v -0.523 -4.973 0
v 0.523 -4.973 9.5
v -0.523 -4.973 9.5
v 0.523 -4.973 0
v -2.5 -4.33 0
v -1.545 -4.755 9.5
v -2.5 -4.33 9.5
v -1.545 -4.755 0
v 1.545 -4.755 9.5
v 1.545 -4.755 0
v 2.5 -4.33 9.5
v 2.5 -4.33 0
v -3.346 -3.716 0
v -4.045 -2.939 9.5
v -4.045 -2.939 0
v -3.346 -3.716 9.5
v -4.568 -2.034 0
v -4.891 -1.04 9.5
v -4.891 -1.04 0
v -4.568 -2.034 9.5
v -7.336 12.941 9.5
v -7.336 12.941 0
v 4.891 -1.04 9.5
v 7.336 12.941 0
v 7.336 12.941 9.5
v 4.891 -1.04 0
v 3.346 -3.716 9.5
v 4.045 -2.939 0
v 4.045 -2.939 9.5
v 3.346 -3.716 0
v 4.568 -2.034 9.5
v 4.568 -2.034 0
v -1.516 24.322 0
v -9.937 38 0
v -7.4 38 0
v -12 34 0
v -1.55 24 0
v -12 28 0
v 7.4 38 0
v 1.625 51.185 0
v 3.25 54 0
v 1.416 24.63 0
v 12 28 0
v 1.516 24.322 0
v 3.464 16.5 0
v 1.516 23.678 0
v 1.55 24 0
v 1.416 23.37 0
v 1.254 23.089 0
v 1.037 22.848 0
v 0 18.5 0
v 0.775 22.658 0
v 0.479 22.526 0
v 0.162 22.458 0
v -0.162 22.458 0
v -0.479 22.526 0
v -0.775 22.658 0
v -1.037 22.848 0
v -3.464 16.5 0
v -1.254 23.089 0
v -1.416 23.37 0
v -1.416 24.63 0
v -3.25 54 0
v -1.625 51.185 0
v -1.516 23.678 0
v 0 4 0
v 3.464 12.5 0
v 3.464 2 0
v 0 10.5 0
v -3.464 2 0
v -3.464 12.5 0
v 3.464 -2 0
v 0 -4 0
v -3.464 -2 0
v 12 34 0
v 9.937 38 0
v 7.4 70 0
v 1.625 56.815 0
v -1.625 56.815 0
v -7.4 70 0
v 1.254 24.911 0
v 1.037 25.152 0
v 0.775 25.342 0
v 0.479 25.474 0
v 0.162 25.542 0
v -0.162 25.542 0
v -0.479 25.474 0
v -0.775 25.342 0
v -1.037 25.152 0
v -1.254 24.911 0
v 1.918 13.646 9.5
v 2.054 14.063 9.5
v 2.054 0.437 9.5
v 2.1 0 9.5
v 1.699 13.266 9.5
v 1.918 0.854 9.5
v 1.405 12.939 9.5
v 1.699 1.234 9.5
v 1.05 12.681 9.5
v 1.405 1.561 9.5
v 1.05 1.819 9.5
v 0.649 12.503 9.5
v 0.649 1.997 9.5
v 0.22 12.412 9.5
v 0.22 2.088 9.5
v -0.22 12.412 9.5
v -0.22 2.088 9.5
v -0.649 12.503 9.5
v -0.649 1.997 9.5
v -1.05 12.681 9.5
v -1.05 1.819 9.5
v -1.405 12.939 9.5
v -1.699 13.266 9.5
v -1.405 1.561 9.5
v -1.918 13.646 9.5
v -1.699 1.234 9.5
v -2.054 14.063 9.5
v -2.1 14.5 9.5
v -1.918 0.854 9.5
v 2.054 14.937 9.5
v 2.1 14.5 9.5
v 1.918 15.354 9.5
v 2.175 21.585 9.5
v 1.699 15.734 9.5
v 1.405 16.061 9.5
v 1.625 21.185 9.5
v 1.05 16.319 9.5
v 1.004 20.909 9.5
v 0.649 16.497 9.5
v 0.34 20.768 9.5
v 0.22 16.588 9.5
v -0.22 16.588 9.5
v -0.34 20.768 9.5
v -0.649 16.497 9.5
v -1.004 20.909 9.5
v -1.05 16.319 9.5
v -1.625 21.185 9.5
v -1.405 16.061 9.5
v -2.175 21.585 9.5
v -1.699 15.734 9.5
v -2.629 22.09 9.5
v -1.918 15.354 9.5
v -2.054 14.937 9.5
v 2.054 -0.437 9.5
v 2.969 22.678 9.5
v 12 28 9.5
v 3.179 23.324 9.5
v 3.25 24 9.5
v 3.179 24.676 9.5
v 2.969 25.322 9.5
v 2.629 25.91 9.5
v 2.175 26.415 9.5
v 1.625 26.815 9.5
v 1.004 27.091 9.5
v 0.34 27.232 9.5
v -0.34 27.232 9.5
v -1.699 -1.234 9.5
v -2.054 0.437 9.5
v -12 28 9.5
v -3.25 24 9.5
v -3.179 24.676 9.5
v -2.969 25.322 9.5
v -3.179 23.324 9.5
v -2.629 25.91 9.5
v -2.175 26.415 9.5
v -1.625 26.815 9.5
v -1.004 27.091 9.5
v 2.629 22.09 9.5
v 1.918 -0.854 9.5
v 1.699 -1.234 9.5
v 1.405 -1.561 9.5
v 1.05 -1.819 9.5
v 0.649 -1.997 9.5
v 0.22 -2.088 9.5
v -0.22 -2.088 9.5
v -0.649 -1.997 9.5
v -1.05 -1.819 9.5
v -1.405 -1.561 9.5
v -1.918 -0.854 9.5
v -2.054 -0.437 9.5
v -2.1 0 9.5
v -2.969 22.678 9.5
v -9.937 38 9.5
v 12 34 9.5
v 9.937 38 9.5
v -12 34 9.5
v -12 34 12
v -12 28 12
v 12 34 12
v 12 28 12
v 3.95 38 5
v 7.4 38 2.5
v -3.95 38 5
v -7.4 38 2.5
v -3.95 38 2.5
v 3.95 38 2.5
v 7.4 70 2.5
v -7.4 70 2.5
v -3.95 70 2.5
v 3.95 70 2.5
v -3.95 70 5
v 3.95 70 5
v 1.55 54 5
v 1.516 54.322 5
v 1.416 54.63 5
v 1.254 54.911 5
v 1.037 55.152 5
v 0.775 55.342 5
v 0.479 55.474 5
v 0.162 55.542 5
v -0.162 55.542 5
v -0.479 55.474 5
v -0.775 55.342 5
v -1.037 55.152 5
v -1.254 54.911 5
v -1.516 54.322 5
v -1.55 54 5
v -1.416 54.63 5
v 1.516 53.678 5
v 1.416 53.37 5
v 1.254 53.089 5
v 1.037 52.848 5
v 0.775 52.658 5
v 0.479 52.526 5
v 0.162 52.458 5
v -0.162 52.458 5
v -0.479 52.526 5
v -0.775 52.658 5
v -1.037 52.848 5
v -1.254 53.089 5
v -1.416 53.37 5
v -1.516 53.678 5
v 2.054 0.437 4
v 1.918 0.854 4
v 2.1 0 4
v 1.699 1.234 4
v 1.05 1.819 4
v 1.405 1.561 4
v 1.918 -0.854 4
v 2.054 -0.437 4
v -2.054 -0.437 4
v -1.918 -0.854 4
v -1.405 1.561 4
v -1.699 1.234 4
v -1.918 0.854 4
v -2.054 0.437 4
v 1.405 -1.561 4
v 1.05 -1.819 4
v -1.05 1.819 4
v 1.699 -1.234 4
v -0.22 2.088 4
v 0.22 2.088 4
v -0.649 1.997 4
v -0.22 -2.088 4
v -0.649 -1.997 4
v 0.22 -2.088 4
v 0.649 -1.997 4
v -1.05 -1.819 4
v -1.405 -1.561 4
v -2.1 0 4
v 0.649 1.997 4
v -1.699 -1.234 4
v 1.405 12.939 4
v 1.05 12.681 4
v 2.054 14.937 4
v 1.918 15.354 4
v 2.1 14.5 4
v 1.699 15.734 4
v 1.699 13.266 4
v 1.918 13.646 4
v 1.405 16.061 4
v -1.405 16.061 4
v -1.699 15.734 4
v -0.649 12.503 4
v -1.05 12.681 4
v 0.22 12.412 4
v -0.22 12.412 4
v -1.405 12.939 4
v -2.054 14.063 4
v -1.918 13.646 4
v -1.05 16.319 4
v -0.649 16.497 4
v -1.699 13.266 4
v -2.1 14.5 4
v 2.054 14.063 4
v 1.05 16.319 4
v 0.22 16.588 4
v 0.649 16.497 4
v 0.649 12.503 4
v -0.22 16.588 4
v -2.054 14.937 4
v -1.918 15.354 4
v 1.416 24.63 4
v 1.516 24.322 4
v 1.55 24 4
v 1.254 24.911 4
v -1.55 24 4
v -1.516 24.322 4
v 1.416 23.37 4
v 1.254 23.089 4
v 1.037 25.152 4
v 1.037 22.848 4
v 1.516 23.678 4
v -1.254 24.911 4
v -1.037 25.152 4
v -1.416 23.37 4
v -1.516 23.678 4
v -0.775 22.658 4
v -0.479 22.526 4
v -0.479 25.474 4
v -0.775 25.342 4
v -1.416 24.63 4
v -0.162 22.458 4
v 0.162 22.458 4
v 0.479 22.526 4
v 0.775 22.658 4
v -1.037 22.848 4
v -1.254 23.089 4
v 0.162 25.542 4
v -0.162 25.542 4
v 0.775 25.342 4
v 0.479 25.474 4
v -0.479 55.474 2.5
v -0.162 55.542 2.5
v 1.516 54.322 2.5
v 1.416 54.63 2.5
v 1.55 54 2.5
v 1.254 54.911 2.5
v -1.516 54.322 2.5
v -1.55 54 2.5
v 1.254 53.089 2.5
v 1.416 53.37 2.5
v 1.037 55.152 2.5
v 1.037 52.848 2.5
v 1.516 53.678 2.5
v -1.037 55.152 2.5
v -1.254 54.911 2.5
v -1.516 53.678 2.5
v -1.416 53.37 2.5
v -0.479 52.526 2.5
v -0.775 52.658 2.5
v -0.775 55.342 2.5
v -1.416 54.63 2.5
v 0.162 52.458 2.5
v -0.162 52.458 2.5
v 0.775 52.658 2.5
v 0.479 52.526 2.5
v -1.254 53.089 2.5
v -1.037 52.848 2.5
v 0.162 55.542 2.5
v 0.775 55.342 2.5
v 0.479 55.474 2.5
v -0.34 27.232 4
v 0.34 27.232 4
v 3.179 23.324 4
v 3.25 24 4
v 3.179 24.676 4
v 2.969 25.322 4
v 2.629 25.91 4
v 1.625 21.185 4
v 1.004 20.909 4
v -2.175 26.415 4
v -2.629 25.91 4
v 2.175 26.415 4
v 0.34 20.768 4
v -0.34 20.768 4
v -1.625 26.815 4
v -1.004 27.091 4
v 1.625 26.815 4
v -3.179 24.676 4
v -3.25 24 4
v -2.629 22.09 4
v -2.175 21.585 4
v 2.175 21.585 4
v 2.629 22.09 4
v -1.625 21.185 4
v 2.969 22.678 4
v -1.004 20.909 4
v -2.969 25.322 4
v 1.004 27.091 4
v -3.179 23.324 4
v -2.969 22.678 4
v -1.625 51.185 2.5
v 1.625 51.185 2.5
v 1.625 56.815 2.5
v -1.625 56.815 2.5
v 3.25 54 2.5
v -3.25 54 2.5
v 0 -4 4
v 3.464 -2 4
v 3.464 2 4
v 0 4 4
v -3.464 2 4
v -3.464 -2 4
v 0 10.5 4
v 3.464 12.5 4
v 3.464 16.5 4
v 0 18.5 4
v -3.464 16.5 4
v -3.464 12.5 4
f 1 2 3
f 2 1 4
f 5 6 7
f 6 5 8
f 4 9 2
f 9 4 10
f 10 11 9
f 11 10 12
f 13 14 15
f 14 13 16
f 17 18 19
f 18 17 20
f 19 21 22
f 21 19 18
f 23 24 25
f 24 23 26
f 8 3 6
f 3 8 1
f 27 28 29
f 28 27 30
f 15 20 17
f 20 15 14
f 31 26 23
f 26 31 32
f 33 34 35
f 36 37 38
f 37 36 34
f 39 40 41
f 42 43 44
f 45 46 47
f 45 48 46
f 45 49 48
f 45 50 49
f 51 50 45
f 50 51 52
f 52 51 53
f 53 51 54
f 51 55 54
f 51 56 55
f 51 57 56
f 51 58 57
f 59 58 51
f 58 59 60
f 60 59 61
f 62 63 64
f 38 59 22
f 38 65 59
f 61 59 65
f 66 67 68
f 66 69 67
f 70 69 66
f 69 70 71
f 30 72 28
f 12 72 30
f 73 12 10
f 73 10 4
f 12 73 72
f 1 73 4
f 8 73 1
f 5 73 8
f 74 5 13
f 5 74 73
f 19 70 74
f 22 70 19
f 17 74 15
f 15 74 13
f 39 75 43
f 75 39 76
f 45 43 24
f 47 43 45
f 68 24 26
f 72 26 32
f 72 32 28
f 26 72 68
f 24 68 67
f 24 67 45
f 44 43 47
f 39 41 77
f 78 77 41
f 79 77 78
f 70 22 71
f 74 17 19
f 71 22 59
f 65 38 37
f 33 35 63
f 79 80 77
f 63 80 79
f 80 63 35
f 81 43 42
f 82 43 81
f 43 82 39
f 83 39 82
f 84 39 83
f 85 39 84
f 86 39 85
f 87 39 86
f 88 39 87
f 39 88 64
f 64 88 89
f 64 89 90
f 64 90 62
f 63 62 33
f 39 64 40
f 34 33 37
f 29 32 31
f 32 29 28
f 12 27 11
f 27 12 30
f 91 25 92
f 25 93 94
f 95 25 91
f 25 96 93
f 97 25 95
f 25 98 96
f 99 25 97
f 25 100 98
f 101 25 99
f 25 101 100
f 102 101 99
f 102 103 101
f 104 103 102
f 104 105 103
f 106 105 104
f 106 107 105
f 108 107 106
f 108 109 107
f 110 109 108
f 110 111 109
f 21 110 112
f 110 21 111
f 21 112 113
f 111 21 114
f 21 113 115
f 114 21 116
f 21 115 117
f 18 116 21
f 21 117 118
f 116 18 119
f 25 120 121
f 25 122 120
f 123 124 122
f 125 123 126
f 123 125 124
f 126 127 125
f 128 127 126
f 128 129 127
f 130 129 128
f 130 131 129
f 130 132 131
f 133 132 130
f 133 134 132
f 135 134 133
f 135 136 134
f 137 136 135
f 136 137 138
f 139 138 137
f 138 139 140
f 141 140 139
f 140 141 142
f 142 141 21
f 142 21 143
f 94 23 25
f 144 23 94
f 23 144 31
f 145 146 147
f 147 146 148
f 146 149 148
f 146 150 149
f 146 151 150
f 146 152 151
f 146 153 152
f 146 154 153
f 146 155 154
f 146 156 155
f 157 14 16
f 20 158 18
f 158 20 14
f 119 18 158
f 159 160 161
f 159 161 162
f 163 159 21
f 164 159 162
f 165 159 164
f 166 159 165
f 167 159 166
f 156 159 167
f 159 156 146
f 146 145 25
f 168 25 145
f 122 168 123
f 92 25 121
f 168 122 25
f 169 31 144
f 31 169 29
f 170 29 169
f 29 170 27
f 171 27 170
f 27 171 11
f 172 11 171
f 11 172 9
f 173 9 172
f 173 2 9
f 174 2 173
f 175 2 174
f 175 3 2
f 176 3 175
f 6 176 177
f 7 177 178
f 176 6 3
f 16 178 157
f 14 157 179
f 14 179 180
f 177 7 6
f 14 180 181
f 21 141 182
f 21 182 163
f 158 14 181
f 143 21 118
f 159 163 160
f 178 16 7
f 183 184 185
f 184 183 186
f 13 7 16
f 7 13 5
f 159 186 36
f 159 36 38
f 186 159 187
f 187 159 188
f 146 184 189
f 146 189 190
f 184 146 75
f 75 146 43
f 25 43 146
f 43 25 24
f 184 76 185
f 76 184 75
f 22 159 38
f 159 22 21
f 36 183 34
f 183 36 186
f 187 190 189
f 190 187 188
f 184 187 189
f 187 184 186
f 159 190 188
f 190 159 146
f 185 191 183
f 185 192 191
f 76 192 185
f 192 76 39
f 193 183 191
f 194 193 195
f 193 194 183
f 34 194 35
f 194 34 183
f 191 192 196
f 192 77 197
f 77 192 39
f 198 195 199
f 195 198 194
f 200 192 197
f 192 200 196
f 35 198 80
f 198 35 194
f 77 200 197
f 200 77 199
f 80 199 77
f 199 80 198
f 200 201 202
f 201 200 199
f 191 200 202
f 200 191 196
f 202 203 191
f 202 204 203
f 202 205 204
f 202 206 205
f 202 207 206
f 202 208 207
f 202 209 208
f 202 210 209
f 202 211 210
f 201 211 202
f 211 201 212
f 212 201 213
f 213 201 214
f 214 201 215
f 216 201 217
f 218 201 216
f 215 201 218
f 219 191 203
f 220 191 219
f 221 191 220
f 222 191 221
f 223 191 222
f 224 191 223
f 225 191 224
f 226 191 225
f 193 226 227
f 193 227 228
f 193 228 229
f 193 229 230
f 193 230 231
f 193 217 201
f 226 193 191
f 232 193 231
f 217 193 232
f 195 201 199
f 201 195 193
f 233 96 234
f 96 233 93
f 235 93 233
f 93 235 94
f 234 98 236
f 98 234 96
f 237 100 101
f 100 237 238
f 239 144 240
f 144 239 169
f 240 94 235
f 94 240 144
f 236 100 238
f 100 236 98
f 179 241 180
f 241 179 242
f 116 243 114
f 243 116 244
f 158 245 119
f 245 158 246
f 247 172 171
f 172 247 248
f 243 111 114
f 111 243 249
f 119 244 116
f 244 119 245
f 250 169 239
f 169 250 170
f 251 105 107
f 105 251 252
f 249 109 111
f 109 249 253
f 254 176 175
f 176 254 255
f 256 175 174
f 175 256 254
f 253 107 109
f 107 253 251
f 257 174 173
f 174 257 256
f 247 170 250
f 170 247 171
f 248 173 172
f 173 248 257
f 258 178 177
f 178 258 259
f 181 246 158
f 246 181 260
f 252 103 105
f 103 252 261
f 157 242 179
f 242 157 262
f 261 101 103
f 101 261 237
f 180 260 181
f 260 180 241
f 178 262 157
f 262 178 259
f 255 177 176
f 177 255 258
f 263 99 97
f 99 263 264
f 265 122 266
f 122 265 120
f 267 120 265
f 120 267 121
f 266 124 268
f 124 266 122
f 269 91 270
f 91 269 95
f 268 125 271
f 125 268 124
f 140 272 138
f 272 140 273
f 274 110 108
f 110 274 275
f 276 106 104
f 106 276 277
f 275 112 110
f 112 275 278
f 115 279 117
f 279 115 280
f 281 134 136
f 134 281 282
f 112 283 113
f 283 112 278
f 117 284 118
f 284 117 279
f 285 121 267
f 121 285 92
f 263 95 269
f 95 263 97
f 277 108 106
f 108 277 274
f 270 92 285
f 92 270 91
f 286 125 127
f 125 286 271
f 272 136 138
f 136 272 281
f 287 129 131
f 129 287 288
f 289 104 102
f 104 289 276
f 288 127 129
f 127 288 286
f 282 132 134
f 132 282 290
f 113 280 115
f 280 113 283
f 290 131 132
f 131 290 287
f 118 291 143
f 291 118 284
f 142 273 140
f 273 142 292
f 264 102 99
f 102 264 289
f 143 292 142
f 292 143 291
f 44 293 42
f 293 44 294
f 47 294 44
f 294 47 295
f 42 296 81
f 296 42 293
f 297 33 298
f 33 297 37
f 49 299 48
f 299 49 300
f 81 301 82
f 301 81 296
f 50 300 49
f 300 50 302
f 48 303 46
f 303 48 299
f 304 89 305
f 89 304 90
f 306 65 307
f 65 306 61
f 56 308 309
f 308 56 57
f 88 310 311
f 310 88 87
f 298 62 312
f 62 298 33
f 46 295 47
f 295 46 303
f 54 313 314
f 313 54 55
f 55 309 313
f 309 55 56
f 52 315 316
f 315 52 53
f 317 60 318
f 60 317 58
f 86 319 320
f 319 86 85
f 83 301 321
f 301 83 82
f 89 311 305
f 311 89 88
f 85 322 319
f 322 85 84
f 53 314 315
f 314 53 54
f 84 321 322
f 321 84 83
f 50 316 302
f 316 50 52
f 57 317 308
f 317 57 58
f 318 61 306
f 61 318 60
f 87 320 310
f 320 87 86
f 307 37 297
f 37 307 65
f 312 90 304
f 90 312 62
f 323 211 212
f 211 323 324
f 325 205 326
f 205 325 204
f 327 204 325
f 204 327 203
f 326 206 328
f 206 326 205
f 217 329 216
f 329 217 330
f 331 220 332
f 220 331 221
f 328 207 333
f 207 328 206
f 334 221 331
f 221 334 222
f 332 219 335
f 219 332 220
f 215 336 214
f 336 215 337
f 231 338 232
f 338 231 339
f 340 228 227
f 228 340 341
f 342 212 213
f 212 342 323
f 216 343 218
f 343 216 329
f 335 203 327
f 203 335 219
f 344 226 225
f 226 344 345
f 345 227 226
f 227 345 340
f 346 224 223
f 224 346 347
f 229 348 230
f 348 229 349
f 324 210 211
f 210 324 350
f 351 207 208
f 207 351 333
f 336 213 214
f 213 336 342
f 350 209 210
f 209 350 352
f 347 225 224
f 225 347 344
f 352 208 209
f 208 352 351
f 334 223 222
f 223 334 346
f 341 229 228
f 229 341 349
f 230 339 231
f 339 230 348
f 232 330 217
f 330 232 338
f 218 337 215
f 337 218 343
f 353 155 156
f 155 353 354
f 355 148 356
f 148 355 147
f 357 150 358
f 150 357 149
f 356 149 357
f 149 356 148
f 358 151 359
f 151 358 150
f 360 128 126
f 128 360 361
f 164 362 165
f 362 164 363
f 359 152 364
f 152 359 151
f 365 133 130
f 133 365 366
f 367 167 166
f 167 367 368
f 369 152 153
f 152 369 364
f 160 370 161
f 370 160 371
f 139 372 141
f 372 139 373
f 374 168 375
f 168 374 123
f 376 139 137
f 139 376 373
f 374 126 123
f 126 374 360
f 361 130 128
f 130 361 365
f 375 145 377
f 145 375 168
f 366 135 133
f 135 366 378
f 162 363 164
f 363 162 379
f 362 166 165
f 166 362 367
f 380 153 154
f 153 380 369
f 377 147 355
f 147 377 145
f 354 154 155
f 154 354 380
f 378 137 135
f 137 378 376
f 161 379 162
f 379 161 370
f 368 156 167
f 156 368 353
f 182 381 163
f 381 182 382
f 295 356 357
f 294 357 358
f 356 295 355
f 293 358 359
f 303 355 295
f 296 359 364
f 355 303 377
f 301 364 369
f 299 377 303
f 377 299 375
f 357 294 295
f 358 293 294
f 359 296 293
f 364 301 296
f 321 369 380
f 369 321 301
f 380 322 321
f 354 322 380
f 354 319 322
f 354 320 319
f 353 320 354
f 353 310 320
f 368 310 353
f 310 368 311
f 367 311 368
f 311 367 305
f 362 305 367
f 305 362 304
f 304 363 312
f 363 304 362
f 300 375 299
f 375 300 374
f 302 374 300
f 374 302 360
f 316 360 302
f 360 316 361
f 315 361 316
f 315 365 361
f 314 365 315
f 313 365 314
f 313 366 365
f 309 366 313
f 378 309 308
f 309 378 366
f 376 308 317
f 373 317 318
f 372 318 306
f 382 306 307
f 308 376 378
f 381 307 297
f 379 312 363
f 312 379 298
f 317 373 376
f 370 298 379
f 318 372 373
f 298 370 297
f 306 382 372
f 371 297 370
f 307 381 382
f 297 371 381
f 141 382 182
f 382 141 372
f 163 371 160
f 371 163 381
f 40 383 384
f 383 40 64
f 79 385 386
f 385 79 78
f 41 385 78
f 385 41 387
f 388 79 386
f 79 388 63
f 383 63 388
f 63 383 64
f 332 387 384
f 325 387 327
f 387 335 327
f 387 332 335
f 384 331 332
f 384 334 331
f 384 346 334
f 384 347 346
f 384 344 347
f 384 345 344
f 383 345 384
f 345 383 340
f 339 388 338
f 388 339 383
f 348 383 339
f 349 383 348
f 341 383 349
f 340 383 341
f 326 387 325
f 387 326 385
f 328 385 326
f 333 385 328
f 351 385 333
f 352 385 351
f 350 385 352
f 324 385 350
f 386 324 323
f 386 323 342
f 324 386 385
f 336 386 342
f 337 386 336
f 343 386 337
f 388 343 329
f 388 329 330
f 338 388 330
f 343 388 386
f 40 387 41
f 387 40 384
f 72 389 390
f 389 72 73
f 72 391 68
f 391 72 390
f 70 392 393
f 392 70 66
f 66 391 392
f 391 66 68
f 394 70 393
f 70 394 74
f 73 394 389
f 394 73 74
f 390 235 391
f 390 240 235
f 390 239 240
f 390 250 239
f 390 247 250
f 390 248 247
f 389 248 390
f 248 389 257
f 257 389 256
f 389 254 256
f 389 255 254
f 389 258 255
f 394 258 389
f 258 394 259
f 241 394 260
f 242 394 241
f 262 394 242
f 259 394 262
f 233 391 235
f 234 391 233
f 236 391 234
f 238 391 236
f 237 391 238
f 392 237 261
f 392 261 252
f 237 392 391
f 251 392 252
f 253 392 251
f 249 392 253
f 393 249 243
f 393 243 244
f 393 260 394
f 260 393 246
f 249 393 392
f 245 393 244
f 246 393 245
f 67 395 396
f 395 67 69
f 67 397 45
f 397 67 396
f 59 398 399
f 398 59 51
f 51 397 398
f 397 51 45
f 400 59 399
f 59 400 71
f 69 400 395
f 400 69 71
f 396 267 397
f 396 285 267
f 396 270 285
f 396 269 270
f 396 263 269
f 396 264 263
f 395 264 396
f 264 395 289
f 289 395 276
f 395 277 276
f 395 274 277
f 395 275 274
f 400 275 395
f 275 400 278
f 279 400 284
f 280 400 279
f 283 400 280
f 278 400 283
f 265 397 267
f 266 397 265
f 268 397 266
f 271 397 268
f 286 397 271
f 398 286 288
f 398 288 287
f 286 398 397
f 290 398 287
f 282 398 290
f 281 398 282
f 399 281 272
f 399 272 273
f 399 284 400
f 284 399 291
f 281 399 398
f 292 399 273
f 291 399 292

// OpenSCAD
// Wing adapter with body post

$fs = 0.1;
yd = 10;
m4_d = 4.2;
m3_d = 3.1;
s_dist = 14.5;
post_dist = 24;
lip_dist = 28;
hh = 9.5;
mount_dist = 54;

xx = 24;

m_x1 = 14.8;
m_x2 = 7.9;
m_y = 32;
m_z1 = 2.5;
m_z2 = 2.5;

wingadapter_p();

module wingadapter_p() {
    difference() {
        union() {
            difference() {
                union() {
                    hull() {
                        translate([0,0,0]) cylinder(d = yd, h=hh);
                        translate([0,s_dist,0]) cylinder(d = yd+5, h=hh);
                        translate([0,post_dist,0]) cylinder(d = yd, h=hh);
                    }
                    hull() {
                        translate([0,s_dist,0]) cylinder(d = yd+5, h=hh);
                        translate([-xx/2,lip_dist,0]) cube([xx, 6, hh]);
                        translate([0,mount_dist,0]) cylinder(d = 3, h=hh);
                    }
                    translate([-xx/2,lip_dist,0]) cube([xx, 6, hh+2.5]);
                    
                    
                    
                }
                translate([-50/2,mount_dist-m_y/2,0]) cube([50, m_y, 100]);
            }
            translate([-m_x1/2,mount_dist-m_y/2,0]) cube([m_x1, m_y, m_z1]);
            translate([-m_x2/2,mount_dist-m_y/2,m_z1]) cube([m_x2, m_y, m_z2]);
        }
        // screw holes
        translate([0,0,0])      cylinder(d = m4_d, h=hh);
        translate([0,s_dist,0]) cylinder(d = m4_d, h=hh);
        translate([0,post_dist,0]) cylinder(d = m3_d, h=hh);
        translate([0,mount_dist,0])  cylinder(d = m3_d, h=hh+m_z1+m_z2);
        
        translate([0,post_dist,4]) cylinder(d = 6.5, h=hh);
        
        //muttrar
        translate([0,mount_dist,0])  cylinder(d=6.5, h=2.5, $fn=6);
        
        translate([0,0,0]) rotate([0,0,360/12]) cylinder(d=8, h=4, $fn=6);
        translate([0,s_dist,0]) rotate([0,0,360/12]) cylinder(d=8, h=4, $fn=6);
    }
}
